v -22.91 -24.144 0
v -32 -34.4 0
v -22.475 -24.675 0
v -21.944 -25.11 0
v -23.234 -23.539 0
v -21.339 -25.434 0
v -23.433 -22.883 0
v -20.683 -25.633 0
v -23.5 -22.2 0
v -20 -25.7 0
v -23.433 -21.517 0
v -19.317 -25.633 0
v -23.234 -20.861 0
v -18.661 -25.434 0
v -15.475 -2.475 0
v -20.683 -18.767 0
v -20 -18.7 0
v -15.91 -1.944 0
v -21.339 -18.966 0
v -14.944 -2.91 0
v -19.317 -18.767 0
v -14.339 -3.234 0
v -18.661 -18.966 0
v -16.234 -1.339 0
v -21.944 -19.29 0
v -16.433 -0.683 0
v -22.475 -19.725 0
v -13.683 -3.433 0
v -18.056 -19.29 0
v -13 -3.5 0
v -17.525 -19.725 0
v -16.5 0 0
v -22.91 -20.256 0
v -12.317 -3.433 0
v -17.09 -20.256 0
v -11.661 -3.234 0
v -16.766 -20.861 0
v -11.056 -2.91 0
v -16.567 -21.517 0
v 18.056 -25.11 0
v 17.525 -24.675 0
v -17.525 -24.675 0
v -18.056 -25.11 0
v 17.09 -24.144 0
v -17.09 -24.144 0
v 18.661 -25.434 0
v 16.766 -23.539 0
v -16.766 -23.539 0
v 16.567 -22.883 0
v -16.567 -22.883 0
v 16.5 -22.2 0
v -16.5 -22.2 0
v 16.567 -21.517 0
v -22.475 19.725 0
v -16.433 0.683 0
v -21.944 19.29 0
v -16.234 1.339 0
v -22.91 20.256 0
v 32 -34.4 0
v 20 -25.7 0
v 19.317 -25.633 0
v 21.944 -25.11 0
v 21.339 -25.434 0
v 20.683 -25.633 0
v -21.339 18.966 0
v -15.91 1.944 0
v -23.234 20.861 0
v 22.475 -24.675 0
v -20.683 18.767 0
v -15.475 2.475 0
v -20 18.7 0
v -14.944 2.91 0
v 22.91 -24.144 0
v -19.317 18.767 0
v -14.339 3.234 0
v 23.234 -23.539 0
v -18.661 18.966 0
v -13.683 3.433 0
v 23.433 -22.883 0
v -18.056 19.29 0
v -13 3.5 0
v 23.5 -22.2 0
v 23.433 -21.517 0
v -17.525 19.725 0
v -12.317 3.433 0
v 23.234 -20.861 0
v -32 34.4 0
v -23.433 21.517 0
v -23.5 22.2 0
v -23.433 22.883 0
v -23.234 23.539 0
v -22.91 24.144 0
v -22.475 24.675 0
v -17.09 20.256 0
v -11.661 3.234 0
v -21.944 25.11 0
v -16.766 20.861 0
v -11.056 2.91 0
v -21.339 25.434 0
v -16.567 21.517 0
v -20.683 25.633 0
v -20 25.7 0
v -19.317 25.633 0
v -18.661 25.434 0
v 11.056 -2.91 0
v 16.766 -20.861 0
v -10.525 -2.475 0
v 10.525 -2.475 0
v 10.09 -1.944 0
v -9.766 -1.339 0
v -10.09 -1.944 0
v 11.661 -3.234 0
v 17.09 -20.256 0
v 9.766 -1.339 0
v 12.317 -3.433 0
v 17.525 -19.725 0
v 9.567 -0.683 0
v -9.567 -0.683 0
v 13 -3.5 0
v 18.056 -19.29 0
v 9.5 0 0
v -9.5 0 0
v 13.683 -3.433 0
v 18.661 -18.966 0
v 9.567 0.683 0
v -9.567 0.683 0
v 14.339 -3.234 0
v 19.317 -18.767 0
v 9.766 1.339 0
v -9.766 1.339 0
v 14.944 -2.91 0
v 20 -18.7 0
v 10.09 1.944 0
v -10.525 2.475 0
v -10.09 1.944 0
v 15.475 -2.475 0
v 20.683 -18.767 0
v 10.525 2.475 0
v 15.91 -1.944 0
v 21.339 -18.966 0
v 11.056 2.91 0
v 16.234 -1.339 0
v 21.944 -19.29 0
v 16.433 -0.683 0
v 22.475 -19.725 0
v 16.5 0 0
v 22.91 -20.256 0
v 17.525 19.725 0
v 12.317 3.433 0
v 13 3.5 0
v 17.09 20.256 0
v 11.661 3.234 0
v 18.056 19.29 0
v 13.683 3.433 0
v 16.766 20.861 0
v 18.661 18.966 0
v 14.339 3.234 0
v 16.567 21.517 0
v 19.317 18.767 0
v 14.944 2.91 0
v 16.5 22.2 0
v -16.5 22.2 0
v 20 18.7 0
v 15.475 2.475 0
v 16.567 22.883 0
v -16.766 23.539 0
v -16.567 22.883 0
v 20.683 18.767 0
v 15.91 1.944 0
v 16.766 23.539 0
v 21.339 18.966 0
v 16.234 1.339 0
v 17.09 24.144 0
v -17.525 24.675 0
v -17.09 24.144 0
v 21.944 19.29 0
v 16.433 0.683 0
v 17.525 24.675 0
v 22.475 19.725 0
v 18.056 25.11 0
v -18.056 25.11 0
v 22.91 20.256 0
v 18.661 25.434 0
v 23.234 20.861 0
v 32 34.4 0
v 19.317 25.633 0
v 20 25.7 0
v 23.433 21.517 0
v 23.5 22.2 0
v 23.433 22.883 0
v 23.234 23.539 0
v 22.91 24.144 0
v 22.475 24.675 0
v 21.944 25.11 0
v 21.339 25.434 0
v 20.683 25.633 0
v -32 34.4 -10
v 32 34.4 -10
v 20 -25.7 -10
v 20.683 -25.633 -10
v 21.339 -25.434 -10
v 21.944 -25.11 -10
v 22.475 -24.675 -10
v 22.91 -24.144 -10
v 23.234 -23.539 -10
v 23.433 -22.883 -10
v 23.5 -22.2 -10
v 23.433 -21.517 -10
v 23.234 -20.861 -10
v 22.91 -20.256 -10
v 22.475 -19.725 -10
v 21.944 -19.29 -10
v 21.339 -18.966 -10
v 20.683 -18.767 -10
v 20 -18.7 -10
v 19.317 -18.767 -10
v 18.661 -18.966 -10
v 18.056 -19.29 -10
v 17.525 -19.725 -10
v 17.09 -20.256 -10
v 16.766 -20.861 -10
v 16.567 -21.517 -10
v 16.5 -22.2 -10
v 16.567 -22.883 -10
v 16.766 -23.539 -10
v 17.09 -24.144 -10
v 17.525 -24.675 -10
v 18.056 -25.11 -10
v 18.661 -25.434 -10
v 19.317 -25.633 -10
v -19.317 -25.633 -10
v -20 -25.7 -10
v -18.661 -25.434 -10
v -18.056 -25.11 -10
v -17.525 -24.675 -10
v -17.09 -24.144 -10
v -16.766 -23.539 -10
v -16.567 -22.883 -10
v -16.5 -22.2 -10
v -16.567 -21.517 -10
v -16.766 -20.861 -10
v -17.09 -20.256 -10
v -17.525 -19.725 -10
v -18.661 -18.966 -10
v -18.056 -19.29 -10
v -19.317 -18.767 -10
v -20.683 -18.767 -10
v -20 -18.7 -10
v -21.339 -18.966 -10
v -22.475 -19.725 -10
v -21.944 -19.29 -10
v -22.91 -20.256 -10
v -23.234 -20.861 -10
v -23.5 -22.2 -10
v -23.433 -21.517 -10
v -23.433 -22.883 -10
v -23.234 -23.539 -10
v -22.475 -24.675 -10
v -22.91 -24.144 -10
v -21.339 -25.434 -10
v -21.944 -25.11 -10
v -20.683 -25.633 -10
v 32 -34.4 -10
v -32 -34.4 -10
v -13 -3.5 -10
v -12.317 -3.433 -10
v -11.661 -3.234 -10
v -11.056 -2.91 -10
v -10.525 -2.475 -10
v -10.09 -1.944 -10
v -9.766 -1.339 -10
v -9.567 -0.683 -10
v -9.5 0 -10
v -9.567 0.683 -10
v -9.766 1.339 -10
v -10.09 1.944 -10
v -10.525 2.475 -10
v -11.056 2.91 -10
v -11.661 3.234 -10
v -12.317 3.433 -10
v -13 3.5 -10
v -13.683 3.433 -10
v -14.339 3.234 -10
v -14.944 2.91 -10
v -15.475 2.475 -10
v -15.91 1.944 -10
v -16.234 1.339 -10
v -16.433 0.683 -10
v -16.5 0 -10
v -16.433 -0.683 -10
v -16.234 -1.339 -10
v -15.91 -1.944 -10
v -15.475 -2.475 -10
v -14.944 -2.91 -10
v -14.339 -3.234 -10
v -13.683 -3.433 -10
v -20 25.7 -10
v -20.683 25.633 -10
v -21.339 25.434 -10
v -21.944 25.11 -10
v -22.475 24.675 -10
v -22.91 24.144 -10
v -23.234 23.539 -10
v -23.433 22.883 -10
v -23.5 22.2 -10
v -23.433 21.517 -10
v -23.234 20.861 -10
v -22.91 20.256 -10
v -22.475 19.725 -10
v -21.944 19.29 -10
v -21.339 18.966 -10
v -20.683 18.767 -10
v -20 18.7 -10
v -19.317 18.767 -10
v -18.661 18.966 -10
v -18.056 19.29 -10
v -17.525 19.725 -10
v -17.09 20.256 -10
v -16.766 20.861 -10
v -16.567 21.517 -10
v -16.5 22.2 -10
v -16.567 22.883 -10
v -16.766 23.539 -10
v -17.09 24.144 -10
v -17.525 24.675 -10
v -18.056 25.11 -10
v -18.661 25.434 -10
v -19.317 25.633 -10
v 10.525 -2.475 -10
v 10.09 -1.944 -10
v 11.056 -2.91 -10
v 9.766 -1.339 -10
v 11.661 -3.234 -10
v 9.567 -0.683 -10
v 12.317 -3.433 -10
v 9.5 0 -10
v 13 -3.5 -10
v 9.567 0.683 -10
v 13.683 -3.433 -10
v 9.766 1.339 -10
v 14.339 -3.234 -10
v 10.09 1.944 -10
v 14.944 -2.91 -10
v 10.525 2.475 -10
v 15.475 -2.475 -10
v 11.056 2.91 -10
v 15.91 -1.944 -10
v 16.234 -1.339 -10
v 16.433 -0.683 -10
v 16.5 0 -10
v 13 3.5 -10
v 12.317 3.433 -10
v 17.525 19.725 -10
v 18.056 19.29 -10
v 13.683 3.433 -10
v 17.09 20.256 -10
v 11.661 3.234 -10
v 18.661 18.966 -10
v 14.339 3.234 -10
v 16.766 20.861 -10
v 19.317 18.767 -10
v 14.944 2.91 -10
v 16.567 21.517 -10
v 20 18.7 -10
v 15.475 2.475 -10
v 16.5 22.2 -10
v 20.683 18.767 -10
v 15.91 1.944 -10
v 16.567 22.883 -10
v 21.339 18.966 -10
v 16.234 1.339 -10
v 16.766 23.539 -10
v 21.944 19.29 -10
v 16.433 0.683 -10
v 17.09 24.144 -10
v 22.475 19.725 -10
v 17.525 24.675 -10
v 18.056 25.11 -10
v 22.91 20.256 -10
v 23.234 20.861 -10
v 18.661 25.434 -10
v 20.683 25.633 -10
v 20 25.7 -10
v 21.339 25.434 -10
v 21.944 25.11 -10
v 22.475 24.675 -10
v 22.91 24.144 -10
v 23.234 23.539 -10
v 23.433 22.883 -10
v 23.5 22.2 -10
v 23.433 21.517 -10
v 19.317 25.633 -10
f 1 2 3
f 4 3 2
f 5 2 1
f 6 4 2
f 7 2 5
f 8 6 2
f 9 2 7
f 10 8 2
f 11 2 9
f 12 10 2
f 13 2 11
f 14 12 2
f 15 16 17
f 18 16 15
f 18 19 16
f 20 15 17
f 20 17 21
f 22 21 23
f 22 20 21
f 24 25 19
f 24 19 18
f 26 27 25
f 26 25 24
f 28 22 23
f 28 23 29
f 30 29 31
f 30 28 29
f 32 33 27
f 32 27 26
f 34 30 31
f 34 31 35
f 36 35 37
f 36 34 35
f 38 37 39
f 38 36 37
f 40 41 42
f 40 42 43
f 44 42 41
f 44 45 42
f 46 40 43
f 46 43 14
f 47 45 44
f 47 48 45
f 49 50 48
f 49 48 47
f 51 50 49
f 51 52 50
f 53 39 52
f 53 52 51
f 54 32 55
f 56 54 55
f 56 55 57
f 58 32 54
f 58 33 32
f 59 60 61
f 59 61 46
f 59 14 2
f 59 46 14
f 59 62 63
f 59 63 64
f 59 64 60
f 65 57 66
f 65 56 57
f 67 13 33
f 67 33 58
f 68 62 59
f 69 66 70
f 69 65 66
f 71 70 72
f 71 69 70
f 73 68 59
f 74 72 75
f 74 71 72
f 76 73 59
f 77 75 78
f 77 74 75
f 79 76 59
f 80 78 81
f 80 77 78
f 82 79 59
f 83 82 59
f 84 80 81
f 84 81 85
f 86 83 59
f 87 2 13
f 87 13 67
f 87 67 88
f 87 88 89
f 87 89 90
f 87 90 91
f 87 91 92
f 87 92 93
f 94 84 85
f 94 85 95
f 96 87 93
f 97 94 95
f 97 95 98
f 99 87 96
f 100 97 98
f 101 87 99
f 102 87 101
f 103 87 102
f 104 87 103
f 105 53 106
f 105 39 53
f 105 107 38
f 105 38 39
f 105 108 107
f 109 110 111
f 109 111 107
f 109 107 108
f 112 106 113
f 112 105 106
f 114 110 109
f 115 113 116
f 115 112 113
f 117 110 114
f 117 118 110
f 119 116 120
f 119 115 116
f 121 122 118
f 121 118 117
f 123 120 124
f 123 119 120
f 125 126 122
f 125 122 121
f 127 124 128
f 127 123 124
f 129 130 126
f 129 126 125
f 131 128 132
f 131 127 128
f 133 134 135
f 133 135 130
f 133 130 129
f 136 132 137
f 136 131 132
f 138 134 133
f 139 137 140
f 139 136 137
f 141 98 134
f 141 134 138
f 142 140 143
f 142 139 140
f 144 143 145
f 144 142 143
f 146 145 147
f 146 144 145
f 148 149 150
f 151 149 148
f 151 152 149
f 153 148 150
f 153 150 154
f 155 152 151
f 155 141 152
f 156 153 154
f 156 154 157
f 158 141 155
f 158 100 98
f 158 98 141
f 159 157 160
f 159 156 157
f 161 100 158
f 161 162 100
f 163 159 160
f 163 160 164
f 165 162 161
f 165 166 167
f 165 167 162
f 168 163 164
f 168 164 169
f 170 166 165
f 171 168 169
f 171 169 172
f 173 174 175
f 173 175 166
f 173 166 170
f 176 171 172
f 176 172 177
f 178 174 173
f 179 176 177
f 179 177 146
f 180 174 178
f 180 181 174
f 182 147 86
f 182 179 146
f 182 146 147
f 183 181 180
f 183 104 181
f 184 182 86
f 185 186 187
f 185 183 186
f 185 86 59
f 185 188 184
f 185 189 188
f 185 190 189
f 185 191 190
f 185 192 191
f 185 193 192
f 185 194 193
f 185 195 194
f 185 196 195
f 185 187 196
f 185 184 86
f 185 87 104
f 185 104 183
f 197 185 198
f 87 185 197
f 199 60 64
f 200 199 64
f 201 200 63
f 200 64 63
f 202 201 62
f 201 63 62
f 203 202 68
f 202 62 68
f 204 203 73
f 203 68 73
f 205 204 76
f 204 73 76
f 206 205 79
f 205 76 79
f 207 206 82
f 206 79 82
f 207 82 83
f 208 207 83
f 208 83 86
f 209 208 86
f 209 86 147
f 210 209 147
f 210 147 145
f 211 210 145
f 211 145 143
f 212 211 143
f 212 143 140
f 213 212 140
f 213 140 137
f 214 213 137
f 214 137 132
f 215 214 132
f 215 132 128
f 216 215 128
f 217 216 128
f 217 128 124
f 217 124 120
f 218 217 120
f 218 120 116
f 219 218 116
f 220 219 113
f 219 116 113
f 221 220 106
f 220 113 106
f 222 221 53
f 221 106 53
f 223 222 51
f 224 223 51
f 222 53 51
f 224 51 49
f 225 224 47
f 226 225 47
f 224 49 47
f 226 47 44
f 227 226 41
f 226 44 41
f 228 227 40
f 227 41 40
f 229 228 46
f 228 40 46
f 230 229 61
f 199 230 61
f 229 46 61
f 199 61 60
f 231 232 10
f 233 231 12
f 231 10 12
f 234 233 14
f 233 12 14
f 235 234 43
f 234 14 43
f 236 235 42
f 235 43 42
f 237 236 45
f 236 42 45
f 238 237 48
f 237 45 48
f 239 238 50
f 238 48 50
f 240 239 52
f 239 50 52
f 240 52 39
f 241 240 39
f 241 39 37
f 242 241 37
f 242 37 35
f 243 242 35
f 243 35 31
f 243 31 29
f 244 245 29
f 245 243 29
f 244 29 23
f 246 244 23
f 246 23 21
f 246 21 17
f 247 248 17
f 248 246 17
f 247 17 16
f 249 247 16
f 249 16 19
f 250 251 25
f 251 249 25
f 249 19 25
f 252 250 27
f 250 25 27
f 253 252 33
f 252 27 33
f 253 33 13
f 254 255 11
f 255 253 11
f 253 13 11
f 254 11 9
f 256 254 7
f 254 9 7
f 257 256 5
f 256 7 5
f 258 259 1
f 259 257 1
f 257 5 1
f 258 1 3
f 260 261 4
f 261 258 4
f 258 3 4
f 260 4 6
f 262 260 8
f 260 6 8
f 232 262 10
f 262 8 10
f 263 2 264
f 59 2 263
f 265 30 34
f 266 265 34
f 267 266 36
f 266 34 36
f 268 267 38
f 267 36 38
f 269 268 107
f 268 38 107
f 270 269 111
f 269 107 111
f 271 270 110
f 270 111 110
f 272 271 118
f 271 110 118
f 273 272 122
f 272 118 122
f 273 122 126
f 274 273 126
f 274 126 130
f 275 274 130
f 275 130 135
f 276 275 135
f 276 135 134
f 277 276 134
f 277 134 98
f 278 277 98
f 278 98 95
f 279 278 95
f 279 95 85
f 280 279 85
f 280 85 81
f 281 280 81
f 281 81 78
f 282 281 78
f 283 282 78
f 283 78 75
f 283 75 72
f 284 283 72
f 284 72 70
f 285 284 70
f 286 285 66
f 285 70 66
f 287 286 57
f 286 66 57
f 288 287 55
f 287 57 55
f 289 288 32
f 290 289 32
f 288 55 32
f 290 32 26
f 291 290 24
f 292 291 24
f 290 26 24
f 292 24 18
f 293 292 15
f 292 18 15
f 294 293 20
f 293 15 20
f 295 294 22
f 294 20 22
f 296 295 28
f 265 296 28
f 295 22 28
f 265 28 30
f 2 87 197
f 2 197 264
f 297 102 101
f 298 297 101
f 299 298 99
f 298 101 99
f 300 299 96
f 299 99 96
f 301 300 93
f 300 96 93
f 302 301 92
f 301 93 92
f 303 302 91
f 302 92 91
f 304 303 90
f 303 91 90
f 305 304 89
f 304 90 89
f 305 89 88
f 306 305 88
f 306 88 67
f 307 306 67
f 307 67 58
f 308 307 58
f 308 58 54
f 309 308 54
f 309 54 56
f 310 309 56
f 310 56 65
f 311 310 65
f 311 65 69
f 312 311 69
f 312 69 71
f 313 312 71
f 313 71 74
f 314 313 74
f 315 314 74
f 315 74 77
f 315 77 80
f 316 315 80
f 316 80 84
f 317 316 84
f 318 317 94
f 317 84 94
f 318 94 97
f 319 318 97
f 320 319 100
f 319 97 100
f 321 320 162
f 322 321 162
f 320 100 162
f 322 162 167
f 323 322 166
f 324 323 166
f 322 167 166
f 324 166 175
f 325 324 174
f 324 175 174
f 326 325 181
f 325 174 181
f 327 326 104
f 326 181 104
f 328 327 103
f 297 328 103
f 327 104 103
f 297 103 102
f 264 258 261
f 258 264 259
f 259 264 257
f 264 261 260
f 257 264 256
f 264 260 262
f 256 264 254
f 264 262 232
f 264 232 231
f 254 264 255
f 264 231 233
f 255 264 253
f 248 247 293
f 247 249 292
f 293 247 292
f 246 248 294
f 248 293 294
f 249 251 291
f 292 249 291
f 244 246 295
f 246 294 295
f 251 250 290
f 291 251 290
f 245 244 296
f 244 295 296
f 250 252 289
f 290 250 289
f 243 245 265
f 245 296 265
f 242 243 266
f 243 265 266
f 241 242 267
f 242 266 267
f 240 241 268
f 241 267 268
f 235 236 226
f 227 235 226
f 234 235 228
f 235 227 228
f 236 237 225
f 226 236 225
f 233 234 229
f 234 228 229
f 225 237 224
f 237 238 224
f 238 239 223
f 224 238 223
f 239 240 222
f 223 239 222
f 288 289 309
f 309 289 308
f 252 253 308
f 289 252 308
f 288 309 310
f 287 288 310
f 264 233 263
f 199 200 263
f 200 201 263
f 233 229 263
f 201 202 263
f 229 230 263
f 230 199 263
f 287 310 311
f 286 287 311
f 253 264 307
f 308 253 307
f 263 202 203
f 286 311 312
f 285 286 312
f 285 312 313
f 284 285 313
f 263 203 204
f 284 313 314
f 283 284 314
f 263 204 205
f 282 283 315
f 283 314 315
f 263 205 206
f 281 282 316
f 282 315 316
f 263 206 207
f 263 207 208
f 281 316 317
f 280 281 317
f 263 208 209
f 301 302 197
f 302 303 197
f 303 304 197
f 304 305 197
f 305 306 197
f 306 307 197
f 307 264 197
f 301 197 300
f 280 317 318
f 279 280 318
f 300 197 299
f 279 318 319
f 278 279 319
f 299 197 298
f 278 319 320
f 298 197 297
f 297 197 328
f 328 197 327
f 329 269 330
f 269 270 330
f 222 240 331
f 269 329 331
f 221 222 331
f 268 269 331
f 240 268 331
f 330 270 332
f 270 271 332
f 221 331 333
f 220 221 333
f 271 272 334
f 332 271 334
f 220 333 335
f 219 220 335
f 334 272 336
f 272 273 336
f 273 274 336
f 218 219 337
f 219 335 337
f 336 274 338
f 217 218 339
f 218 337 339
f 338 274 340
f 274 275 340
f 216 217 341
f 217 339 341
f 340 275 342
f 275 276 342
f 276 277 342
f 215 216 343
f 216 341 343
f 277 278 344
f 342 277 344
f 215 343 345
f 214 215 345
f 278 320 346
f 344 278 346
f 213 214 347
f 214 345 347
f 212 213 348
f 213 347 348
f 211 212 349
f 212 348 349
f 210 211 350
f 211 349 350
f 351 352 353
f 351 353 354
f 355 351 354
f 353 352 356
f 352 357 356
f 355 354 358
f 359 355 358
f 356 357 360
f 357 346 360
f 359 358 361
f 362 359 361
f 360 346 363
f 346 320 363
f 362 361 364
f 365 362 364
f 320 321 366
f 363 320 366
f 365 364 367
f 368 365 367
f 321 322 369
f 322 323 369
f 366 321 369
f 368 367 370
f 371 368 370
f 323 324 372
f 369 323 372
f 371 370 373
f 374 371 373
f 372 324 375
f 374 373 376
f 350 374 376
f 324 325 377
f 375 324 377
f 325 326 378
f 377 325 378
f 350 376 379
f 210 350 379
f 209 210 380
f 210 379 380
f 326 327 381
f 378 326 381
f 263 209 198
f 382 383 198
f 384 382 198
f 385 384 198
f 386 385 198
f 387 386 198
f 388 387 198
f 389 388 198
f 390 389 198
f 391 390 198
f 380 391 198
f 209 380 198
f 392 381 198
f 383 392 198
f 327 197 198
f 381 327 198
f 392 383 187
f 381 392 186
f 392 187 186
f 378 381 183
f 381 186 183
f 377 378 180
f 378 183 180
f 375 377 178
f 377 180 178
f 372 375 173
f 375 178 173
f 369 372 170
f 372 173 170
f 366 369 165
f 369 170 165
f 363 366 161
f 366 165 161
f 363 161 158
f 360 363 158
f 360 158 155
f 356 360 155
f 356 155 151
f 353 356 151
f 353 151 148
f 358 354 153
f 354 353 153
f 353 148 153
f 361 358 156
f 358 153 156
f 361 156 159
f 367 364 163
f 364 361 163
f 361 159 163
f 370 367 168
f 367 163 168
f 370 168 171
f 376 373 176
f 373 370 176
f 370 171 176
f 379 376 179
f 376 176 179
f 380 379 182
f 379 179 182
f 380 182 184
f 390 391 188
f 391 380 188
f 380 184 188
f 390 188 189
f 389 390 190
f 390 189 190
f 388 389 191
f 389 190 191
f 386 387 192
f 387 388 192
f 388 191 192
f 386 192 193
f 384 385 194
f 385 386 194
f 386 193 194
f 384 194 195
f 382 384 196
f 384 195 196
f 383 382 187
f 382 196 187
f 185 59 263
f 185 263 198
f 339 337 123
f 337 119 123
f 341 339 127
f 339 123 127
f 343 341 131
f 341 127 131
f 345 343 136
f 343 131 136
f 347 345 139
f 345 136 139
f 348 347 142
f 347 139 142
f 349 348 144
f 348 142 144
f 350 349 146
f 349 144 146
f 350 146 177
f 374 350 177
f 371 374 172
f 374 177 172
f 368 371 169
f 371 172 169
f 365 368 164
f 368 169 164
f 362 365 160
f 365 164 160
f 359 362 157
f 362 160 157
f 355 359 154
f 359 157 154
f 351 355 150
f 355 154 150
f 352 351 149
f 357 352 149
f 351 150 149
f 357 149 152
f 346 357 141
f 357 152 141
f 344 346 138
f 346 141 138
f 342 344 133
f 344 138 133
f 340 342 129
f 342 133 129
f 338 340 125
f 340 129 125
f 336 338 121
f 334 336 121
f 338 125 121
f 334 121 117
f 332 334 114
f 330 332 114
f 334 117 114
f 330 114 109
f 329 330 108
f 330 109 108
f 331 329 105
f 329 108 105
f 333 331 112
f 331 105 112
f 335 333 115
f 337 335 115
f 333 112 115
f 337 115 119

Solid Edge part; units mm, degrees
sketch "Sketch1" plane through (0, 0, 0) normal (0, 0, 1) x (1, 0, 0)
  line L0 (32, -10) -> (32, 10)
  line L1 (32, 10) -> (32, 34.4)
  line L2 (32, 34.4) -> (-32, 34.4)
  line L3 (-32, 34.4) -> (-32, 10)
  line L4 (-32, 10) -> (-32, -10)
  line L5 (-32, -10) -> (-32, -34.4)
  line L6 (-32, -34.4) -> (32, -34.4)
  line L7 (32, -34.4) -> (32, -10)
extrude "Protrusion1" add sketch "Sketch1" against normal blind 10
hole "Hole_1" at (20, -22.2, 0) direction (0, 0, -1) diameter 7 end up to next
mirror "Mirror1" about plane through (0, 0, 0) normal (1, 0, 0) of "Hole_1"
mirror "Mirror2" about plane through (0, 0, 0) normal (0, -1, 0) of "Mirror1", "Hole_1"
hole "Hole_4" at (13, 0, 0) direction (0, 0, -1) diameter 7 end up to next
hole "Hole2" at (-13, 0, 0) direction (0, 0, -1) diameter 7 end up to next
